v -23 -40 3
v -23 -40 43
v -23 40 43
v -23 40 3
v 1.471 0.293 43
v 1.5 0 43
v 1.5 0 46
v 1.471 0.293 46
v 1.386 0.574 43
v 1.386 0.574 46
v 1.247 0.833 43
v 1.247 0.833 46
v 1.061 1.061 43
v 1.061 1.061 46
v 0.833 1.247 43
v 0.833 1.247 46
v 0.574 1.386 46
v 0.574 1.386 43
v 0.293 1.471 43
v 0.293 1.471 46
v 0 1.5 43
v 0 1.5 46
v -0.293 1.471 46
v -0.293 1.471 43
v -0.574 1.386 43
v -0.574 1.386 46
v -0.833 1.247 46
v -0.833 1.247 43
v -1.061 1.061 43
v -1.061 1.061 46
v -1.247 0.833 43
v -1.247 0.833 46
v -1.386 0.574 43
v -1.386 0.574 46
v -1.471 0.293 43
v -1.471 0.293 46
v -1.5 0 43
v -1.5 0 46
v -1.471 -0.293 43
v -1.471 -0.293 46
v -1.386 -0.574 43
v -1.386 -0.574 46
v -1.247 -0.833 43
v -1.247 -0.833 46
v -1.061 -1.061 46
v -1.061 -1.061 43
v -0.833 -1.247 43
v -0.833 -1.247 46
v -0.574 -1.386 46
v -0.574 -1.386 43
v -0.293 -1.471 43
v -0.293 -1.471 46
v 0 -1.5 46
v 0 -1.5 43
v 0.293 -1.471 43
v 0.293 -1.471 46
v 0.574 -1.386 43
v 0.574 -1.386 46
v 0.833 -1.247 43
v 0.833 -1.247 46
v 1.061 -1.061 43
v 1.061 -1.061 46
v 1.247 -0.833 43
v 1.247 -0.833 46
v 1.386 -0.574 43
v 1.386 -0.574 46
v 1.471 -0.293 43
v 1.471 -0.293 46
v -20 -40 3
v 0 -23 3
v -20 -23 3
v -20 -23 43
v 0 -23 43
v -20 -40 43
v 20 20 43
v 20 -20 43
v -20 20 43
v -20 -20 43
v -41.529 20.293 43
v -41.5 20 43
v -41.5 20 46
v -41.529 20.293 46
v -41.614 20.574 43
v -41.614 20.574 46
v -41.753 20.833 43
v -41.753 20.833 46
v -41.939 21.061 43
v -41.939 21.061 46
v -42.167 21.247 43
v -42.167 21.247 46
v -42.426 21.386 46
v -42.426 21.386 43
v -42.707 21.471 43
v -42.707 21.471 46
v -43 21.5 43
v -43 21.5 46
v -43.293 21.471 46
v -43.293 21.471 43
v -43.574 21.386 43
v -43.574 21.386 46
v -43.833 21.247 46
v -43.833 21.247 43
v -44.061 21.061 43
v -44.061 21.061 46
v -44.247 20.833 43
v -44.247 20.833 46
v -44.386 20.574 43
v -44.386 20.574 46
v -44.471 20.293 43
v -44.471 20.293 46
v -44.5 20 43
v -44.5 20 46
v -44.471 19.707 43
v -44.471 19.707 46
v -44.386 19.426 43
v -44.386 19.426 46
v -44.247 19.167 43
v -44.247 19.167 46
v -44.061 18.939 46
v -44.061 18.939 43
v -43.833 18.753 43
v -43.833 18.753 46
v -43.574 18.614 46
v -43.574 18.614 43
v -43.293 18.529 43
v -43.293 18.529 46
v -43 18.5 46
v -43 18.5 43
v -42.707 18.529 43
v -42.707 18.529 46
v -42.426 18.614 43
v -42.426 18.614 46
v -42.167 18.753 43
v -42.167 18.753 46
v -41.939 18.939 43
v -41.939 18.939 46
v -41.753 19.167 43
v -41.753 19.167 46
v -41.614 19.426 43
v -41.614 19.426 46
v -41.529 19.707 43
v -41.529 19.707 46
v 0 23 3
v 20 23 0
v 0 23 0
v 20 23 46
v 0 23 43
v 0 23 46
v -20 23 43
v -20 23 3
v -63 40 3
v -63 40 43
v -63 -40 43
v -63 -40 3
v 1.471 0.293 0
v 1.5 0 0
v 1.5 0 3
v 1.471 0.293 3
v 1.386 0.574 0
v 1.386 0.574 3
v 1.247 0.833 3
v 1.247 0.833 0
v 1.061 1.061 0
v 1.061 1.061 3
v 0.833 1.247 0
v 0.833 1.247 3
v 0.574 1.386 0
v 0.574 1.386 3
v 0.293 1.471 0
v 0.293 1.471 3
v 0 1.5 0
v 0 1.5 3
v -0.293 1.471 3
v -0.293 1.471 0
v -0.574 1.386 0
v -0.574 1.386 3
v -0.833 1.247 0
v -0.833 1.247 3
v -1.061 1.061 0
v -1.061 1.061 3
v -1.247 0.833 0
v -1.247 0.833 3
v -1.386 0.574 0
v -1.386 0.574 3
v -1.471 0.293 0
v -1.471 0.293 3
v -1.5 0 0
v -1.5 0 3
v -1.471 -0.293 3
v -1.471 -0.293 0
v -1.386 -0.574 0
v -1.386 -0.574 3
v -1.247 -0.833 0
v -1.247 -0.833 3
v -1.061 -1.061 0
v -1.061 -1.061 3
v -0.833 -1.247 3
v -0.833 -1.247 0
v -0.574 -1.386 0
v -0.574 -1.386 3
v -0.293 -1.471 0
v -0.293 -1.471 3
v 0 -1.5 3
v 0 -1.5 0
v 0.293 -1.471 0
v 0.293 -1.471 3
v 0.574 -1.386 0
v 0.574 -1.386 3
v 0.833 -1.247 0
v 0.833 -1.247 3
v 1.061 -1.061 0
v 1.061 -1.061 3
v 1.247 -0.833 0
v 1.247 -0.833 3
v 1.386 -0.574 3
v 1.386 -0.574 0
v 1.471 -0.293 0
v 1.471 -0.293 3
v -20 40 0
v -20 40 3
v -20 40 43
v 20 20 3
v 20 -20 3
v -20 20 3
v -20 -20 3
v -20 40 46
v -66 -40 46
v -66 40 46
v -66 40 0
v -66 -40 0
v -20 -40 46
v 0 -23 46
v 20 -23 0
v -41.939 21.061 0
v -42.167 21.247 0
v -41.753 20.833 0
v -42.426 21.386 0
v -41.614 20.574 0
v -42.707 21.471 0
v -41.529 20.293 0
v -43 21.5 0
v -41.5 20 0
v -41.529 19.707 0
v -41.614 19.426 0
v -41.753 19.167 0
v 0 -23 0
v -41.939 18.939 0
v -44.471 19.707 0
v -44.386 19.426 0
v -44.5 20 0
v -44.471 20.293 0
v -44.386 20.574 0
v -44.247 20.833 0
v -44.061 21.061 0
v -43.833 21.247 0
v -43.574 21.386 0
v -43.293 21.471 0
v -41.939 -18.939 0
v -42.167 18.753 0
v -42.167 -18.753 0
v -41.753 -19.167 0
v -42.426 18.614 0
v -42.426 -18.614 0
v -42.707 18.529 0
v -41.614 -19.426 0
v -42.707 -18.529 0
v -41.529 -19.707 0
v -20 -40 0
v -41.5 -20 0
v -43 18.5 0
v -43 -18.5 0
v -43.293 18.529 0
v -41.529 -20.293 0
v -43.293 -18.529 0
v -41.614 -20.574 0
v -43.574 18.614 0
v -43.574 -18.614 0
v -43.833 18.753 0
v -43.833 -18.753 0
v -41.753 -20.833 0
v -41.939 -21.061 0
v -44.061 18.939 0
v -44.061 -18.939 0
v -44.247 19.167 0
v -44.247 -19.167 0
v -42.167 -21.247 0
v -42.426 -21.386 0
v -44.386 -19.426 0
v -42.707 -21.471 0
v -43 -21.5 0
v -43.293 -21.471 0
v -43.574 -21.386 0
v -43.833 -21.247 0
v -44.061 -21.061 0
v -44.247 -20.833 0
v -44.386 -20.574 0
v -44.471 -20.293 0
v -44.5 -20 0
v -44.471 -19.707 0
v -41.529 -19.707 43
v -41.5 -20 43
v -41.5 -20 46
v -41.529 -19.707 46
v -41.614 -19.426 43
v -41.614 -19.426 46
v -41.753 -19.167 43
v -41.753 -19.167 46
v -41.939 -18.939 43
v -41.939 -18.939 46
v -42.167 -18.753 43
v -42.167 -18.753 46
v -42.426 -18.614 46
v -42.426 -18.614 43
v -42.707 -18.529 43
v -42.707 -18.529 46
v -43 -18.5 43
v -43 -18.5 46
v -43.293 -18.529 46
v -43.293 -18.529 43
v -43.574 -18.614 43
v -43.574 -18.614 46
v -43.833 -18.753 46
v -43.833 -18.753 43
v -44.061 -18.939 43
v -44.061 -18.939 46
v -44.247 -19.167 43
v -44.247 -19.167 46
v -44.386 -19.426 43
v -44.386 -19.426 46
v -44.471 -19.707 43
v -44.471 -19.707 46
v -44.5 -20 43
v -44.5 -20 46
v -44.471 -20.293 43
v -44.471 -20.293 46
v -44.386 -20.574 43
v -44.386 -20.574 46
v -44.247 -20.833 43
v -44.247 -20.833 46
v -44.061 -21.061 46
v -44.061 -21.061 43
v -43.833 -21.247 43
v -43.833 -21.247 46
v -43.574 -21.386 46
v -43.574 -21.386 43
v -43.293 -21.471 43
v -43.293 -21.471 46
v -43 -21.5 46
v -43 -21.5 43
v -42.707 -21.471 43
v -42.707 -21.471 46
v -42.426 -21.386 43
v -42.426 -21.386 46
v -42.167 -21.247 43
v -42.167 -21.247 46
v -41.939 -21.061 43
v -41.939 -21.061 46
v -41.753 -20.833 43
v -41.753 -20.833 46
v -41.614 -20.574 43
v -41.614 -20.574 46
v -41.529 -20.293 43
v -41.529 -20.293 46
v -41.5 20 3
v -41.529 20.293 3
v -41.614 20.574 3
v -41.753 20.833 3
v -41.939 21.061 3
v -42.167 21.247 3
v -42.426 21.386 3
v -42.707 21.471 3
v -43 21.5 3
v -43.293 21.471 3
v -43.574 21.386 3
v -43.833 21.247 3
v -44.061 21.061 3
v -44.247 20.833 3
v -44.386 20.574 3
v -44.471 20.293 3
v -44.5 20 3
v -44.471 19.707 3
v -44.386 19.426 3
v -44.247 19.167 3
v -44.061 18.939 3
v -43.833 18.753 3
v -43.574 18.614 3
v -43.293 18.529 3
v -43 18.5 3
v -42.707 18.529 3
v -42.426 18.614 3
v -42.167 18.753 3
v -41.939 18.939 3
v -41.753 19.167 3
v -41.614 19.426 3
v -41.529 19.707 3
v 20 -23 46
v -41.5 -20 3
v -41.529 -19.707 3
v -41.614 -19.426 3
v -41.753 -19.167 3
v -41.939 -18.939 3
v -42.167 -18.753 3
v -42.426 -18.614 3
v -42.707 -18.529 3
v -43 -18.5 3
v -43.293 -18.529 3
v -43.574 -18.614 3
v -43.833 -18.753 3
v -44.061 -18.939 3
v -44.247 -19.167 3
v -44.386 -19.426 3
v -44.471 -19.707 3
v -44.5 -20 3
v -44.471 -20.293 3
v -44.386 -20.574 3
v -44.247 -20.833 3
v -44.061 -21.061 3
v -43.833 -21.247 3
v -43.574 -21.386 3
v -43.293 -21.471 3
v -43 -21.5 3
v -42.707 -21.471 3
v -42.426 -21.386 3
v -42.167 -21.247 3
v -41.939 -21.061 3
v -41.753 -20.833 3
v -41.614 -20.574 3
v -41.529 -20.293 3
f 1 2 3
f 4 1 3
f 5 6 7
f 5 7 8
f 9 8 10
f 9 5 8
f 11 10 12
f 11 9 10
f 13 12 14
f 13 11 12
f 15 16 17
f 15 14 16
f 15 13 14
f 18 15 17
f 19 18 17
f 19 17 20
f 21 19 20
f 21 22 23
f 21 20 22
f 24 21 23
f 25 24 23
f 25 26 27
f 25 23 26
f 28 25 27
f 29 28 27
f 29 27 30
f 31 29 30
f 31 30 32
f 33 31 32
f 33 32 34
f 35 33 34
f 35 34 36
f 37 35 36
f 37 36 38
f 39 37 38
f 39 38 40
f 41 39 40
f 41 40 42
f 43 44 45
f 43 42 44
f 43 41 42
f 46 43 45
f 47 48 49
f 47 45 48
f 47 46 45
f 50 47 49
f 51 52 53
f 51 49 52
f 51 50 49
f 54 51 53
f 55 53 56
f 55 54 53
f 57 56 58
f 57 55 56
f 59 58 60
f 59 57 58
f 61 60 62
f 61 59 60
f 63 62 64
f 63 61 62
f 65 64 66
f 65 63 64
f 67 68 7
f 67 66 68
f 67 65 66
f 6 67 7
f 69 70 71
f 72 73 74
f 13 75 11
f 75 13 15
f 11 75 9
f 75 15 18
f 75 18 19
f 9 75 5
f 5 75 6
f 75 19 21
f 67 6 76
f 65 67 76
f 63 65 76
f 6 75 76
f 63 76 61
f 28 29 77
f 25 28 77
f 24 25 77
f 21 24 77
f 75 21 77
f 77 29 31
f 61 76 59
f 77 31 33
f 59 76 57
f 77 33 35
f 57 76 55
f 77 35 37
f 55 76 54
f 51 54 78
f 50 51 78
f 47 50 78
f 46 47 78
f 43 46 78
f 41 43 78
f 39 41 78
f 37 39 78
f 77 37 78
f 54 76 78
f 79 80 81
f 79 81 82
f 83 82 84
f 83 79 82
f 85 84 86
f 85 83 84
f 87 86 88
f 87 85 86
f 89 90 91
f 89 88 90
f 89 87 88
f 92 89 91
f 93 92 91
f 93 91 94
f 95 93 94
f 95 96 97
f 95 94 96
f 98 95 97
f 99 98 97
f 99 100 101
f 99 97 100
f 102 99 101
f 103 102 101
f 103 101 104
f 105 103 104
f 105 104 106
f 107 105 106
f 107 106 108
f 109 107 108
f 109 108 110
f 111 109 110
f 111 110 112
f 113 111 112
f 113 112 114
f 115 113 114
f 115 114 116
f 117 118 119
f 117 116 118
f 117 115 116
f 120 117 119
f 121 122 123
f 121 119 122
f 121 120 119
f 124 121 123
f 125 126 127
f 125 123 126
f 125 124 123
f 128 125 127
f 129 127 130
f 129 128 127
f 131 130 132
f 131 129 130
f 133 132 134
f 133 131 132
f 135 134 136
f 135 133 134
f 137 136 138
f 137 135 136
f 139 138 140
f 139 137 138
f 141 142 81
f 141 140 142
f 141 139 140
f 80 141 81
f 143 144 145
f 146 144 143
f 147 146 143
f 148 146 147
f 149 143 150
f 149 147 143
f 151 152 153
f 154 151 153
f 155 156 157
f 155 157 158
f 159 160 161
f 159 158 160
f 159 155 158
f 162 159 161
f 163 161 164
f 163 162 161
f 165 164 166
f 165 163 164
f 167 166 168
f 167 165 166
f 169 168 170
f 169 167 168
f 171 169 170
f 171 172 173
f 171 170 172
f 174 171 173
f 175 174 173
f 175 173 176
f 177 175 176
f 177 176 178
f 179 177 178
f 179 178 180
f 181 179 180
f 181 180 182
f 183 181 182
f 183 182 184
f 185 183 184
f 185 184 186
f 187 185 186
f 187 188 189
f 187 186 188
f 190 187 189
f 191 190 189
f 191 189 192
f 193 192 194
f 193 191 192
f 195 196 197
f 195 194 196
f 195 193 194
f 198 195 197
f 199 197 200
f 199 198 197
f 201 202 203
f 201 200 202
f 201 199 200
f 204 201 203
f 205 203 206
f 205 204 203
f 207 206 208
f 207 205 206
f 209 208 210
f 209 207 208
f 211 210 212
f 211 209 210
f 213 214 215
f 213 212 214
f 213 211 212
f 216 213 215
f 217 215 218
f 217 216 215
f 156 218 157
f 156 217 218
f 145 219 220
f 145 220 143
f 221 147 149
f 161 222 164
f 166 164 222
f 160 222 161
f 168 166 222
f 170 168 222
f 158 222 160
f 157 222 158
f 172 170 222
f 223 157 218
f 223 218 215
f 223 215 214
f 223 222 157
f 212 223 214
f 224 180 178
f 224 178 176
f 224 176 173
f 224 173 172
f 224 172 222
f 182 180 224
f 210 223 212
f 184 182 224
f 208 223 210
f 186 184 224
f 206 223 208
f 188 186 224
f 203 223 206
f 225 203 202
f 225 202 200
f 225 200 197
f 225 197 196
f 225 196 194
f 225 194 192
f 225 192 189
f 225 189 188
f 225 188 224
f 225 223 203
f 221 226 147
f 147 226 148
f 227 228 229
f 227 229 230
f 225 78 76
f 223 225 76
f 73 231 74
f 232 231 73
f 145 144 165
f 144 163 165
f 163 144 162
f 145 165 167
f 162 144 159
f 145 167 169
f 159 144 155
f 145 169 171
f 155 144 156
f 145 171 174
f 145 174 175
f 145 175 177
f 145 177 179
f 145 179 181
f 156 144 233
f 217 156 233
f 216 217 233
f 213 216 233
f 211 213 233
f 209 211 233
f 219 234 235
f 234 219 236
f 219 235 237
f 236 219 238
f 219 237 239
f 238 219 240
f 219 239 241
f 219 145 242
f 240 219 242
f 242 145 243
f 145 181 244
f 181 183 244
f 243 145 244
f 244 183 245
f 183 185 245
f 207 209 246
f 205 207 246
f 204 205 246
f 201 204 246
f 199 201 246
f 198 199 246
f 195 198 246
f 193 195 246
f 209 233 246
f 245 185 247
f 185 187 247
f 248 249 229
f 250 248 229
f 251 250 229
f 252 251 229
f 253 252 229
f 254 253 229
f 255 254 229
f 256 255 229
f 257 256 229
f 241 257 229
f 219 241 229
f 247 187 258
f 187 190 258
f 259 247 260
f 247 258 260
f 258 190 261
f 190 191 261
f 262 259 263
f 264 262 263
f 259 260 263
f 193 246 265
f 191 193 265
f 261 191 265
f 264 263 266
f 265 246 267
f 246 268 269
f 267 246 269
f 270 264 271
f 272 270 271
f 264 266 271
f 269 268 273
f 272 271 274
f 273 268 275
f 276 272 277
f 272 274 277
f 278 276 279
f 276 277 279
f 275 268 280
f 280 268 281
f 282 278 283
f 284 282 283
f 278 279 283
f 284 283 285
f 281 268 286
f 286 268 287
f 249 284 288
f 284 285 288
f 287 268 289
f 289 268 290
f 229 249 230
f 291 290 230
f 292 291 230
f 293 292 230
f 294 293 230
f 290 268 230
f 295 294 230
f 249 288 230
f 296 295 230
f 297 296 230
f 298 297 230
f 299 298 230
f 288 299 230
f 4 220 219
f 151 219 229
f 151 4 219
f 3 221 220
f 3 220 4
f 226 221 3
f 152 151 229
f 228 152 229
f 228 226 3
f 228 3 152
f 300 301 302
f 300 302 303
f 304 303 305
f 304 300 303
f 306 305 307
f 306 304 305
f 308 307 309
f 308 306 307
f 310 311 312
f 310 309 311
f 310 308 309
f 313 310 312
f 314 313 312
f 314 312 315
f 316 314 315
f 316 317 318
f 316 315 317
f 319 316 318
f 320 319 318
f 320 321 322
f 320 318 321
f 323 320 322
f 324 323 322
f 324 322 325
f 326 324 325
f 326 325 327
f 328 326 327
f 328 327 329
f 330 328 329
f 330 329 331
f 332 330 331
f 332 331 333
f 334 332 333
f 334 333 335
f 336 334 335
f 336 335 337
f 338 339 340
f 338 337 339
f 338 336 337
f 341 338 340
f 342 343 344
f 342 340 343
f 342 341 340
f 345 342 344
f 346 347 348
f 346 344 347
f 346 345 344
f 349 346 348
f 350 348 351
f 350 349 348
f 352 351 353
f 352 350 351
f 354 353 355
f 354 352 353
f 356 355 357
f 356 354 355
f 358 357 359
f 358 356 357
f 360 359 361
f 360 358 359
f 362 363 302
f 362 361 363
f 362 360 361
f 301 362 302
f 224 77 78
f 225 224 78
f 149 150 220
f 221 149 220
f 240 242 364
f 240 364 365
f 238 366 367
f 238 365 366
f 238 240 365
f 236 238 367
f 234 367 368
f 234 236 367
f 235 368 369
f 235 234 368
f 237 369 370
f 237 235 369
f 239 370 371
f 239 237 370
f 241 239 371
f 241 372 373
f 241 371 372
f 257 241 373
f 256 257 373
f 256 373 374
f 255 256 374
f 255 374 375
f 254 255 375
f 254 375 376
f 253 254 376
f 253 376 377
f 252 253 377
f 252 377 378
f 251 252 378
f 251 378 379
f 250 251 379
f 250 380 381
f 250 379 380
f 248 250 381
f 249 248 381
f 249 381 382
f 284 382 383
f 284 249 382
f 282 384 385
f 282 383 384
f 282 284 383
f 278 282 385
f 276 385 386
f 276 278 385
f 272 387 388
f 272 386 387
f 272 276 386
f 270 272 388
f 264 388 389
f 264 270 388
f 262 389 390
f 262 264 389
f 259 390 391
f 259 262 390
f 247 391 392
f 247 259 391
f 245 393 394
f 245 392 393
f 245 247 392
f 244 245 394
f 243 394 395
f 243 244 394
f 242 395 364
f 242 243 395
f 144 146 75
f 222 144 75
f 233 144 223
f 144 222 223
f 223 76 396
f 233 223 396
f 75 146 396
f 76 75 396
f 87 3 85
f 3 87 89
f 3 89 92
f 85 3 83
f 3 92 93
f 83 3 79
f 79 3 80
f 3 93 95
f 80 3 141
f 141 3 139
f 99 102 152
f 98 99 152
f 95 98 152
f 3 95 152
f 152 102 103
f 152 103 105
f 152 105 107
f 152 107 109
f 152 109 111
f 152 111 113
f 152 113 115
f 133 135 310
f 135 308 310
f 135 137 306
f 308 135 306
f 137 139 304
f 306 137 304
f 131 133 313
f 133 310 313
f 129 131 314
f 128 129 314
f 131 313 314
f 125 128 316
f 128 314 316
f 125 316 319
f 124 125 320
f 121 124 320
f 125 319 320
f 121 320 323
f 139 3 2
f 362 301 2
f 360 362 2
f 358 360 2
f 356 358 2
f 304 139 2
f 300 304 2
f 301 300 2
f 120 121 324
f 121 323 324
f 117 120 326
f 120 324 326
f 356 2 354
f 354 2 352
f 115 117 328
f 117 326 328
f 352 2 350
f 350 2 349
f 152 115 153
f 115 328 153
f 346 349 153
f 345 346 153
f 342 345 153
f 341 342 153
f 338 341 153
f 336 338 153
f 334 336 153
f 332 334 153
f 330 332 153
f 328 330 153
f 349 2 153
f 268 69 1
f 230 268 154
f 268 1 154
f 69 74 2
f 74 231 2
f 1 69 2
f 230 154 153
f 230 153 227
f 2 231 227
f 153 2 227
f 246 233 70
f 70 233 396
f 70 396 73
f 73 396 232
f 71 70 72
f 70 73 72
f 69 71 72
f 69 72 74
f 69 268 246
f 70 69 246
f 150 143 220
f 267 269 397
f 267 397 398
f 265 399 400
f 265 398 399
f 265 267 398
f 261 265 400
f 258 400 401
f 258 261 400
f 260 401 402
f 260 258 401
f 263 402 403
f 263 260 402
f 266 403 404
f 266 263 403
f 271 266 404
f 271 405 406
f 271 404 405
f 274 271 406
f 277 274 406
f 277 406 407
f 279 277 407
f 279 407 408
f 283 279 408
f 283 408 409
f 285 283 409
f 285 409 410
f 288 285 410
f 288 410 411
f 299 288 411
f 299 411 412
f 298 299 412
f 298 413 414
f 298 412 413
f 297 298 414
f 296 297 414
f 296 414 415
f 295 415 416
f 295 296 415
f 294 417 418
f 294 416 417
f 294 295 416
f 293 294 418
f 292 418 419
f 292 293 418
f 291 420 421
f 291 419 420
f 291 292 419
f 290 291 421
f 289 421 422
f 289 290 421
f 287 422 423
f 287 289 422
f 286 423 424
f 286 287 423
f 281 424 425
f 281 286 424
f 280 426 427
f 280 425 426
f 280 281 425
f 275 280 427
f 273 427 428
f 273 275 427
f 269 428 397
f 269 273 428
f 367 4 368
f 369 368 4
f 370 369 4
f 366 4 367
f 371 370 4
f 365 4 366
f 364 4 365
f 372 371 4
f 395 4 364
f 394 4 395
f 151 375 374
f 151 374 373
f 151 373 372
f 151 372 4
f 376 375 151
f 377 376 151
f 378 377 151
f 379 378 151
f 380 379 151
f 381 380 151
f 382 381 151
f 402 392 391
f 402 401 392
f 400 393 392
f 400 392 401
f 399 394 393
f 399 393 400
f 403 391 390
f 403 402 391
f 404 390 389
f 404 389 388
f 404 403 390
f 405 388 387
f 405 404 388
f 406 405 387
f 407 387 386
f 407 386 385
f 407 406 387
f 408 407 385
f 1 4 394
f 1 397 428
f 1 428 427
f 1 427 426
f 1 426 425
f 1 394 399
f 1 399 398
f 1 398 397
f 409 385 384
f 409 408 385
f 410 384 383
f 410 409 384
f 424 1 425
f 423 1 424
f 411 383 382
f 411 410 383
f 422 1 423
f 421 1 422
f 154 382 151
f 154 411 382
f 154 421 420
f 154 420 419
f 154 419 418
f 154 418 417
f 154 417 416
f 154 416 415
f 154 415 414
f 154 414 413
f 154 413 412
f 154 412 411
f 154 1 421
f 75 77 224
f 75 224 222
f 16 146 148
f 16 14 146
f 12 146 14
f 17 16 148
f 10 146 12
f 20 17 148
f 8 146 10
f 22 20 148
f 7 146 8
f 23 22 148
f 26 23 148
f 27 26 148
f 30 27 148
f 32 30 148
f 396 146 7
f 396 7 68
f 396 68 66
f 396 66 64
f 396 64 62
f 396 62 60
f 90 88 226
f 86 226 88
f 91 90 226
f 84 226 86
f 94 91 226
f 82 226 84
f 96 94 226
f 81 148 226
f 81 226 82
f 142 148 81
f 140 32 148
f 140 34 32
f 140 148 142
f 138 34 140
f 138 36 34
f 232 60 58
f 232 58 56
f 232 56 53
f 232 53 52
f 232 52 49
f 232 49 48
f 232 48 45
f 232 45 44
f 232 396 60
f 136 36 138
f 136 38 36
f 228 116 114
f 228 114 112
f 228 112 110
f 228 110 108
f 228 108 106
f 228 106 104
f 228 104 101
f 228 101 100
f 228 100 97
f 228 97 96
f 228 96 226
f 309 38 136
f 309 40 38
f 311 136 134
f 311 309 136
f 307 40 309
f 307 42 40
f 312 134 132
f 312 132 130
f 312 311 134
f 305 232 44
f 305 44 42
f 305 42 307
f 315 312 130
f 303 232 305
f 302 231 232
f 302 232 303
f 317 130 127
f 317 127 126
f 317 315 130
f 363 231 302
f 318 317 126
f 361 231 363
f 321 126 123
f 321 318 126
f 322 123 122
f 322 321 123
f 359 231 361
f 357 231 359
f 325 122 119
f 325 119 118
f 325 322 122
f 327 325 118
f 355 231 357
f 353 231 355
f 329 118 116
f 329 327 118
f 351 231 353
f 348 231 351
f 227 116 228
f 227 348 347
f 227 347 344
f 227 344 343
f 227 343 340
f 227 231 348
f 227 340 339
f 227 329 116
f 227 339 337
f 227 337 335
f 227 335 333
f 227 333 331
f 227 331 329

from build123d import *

# Parameters (mm, degrees)
BOSS_EXTRU_1_DEPTH           = 3
ESQUISSE2_W                  = 3
ESQUISSE2_H                  = 40
BOSS_EXTRU_2_DEPTH           = 20
ENL_V_MAT_EXTRU_1_DEPTH      = 90.844309781
ENL_V_MAT_EXTRU_1_DEPTH_BACK = 90.844309781
ESQUISSE3_R                  = 1.5


with BuildPart() as part:
    # Esquisse1 → Boss.-Extru.1 (new body)
    with BuildSketch(Plane.XY):
        Polygon((-66, 40), (-20, 40), (0, 23), (20, 23), (20, 0), (0, 0), (-66, 0), align=None)
    extrude(amount=BOSS_EXTRU_1_DEPTH)

    # Esquisse2 → Boss.-Extru.2 (add)
    with BuildSketch(Plane.XY.offset(3)):
        Polygon((20, 23), (-20, 23), (-20, 40), (-23, 40), (-23, 0), (-20, 0), (-20, 20), (20, 20), align=None)
        with Locations((-64.5, 20)):
            Rectangle(ESQUISSE2_W, ESQUISSE2_H)
    extrude(amount=BOSS_EXTRU_2_DEPTH)

    # Symétrie1: part across plane


with BuildPart() as part_1:
    add(part.part)
    add(part.part.mirror(Plane(origin=(20, 0, 3), x_dir=(0, 0, 1), z_dir=(0, 1, 0))))

    # Symétrie2: part across plane


with BuildPart() as part_2:
    add(part_1.part)
    add(part_1.part.mirror(Plane.XY.offset(23)))

    # Esquisse3 → Enlèv. mat.-Extru.1 (cut, two sides: drawn at the far end of the back side and taken through both)
    with BuildSketch(Plane.XY.offset(46).offset(-ENL_V_MAT_EXTRU_1_DEPTH_BACK)):
        with Locations((-43, 20)):
            Circle(ESQUISSE3_R)
        with Locations((-43, -20)):
            Circle(ESQUISSE3_R)
        Circle(ESQUISSE3_R)
    extrude(amount=ENL_V_MAT_EXTRU_1_DEPTH + ENL_V_MAT_EXTRU_1_DEPTH_BACK, mode=Mode.SUBTRACT)


solid = part_2.part
